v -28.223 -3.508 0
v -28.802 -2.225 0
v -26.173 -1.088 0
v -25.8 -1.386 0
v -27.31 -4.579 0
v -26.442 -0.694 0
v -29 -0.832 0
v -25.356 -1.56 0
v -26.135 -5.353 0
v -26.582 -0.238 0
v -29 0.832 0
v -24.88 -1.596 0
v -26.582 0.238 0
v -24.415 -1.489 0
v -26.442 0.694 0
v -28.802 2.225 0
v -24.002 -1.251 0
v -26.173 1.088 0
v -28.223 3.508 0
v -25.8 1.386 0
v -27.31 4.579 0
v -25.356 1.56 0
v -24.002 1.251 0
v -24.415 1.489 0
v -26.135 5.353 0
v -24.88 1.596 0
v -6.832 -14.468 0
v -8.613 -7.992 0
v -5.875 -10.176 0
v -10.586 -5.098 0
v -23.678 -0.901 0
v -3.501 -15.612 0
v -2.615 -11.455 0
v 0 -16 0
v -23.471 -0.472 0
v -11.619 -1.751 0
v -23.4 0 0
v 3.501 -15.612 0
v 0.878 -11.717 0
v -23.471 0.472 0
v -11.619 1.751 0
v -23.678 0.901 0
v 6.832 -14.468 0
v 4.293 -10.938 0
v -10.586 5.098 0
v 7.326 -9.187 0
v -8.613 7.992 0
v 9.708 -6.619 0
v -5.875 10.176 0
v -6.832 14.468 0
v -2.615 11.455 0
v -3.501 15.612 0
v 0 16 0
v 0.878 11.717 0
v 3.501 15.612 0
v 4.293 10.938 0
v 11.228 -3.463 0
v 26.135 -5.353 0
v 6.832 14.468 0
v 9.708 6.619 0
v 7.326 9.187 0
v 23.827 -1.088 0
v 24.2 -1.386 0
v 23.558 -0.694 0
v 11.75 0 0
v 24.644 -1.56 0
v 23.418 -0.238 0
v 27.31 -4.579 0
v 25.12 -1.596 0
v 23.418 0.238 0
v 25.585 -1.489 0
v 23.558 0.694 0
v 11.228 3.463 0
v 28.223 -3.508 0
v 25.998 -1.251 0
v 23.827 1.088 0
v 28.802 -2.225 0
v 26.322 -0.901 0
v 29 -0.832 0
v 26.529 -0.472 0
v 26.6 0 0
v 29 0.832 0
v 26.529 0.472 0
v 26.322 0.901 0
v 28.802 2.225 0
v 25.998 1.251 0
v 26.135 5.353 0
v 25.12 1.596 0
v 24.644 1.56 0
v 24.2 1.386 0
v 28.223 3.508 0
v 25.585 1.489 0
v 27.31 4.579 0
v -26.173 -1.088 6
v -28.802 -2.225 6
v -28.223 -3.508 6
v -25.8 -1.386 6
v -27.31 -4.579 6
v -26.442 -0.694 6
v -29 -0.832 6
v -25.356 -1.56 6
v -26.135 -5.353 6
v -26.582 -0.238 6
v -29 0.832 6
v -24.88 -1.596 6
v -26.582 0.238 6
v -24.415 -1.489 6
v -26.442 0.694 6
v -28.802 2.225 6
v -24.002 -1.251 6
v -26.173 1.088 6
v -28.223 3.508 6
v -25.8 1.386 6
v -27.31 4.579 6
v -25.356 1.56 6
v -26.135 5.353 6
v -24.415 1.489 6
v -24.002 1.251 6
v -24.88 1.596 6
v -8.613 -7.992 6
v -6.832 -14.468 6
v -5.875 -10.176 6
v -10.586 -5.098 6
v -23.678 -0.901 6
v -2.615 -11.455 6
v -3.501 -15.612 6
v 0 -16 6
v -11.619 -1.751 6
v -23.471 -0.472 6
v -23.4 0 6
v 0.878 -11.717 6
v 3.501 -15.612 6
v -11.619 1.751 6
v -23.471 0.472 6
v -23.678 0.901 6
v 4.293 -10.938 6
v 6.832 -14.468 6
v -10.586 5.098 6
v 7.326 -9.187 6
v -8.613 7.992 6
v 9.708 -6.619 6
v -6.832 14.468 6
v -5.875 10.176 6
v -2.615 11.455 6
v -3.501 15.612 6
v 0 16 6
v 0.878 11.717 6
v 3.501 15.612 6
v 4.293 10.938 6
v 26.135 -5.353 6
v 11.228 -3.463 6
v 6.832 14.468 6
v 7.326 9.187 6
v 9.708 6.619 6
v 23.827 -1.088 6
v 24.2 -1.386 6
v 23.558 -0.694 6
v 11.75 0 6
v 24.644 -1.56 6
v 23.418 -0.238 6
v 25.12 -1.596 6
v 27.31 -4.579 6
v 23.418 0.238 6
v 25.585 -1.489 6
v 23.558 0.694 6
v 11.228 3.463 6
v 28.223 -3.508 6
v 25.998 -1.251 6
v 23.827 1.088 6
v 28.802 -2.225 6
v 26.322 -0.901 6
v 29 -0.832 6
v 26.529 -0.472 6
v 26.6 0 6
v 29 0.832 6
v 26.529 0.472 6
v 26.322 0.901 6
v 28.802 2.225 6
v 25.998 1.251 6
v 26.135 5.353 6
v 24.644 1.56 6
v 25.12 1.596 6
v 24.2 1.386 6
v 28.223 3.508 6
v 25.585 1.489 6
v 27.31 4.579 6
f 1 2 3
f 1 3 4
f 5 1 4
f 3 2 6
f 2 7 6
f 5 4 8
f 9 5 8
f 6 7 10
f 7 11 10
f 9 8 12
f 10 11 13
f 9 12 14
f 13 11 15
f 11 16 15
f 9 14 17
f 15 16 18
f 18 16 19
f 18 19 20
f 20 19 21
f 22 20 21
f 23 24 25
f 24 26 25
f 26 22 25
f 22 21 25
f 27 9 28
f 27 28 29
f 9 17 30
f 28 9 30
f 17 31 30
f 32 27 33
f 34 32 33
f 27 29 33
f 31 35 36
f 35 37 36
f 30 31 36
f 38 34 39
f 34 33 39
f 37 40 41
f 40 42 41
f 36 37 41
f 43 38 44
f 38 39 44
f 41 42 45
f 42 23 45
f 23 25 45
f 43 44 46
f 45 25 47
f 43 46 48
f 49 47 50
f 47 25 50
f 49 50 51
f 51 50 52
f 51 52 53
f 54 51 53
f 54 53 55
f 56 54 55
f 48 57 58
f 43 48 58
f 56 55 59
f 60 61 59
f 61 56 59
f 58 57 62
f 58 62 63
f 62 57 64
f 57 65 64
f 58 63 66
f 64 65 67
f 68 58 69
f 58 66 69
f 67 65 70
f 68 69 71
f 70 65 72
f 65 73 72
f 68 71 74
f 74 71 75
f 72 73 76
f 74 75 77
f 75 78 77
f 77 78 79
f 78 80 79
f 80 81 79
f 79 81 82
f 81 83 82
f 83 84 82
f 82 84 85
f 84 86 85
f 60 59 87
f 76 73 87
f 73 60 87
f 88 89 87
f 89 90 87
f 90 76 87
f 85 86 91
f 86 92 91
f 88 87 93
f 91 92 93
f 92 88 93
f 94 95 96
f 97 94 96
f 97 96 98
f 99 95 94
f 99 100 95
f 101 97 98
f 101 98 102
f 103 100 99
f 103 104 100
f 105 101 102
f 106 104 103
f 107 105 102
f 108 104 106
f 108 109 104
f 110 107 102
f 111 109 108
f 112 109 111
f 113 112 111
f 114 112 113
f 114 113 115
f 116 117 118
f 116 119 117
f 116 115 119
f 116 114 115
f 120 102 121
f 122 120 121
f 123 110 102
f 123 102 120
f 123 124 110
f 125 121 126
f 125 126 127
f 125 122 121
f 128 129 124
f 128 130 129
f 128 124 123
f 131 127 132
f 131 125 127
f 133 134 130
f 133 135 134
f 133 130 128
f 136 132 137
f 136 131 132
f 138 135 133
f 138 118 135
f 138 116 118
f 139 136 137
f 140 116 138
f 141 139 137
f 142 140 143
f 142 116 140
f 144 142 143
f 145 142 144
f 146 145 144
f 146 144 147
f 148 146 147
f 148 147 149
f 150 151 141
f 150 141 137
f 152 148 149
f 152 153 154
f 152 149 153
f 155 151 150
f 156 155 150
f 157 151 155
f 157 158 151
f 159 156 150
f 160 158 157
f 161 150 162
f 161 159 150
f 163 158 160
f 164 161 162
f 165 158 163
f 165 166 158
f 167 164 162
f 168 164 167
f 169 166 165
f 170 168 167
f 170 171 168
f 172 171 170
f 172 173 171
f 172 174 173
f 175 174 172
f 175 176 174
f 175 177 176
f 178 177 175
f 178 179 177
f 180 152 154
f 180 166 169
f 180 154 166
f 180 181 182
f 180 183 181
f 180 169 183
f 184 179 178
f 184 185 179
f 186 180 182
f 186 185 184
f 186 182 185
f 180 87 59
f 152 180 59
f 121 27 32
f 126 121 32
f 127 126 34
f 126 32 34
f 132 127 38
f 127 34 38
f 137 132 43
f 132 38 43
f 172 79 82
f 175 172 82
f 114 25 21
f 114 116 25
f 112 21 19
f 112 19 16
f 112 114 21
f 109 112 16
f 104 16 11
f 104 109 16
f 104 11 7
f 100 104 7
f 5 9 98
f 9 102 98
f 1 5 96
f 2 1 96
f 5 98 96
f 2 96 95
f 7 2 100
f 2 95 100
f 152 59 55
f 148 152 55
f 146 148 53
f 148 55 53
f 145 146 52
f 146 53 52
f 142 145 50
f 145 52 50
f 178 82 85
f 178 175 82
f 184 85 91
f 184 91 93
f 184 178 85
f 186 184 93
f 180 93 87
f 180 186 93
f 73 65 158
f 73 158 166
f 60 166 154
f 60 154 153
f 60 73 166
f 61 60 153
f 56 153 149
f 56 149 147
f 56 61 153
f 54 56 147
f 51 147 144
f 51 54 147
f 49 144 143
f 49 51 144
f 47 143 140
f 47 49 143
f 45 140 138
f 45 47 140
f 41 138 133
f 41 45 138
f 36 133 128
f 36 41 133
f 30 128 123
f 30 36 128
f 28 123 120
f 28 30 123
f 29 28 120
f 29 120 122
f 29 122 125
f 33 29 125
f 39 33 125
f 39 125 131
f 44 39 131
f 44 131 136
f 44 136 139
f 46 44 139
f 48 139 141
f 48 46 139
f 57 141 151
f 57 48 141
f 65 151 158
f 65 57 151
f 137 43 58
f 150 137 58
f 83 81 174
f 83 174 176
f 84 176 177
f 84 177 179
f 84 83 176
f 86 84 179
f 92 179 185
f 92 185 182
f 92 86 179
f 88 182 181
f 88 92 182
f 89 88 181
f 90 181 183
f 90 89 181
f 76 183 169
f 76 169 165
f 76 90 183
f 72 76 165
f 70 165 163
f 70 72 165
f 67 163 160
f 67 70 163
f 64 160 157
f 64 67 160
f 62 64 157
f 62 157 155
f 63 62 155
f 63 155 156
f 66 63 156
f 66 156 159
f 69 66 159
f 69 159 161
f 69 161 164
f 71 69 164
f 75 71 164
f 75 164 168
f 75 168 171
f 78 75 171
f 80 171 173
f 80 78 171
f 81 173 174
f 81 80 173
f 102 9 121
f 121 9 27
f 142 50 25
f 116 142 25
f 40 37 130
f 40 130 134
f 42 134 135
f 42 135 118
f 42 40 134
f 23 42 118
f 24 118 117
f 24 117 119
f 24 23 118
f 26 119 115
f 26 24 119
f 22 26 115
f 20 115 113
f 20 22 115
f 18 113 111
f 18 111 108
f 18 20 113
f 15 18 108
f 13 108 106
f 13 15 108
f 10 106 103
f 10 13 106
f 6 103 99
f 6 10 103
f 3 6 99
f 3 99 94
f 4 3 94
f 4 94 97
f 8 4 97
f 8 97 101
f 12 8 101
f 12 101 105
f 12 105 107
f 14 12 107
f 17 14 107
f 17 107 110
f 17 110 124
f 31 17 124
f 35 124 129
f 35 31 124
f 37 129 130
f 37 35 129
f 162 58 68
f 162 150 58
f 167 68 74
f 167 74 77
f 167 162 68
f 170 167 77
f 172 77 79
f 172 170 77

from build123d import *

# Parameters (mm, degrees)
ESBO_O1_R                = 11.75
ESBO_O1_R_2              = 1.6
RESSALTO_EXTRUS_O1_DEPTH = 6
FILETE3_R                = 5


with BuildPart() as part:
    # Esboço1 → Ressalto-extrusão1 (new body)
    with BuildSketch(Plane.XY):
        with BuildLine():
            Line((-15.491933385, -4), (-29, -4))
            Line((-29, -4), (-6.831996166, -14.468027799))
            ThreePointArc((-6.831996166, -14.468027799), (-12.328193669, -10.198805854), (-15.491933385, -4))
        make_face()
        with BuildLine():
            Line((-29, -4), (-15.491933385, -4))
            ThreePointArc((-15.491933385, -4), (0, -16), (15.491933385, -4))
            Line((15.491933385, -4), (29, -4))
            Line((29, -4), (29, 4))
            Line((29, 4), (15.491933385, 4))
            ThreePointArc((15.491933385, 4), (0, 16), (-15.491933385, 4))
            Line((-15.491933385, 4), (-29, 4))
            Line((-29, 4), (-29, -4))
        make_face()
        Circle(ESBO_O1_R, mode=Mode.SUBTRACT)
        with Locations((-25, 0)):
            Circle(ESBO_O1_R_2, mode=Mode.SUBTRACT)
        with Locations((25, 0)):
            Circle(ESBO_O1_R_2, mode=Mode.SUBTRACT)
        with BuildLine():
            Line((-6.831996166, 14.468027799), (-29, 4))
            Line((-29, 4), (-15.491933385, 4))
            ThreePointArc((-15.491933385, 4), (-12.328193669, 10.198805854), (-6.831996166, 14.468027799))
        make_face()
        with BuildLine():
            Line((29, 4), (6.831996166, 14.468027799))
            ThreePointArc((6.831996166, 14.468027799), (12.328193669, 10.198805854), (15.491933385, 4))
            Line((15.491933385, 4), (29, 4))
        make_face()
        with BuildLine():
            ThreePointArc((15.491933385, -4), (12.328193669, -10.198805854), (6.831996166, -14.468027799))
            Line((6.831996166, -14.468027799), (29, -4))
            Line((29, -4), (15.491933385, -4))
        make_face()
    extrude(amount=RESSALTO_EXTRUS_O1_DEPTH)

    # Filete3
    filete3_edges = [part.edges().sort_by_distance(p)[0] for p in [
        (29, 4, 3),
        (29, -4, 3),
        (-29, -4, 3),
        (-29, 4, 3),
    ]]
    fillet(filete3_edges, radius=FILETE3_R)


solid = part.part
